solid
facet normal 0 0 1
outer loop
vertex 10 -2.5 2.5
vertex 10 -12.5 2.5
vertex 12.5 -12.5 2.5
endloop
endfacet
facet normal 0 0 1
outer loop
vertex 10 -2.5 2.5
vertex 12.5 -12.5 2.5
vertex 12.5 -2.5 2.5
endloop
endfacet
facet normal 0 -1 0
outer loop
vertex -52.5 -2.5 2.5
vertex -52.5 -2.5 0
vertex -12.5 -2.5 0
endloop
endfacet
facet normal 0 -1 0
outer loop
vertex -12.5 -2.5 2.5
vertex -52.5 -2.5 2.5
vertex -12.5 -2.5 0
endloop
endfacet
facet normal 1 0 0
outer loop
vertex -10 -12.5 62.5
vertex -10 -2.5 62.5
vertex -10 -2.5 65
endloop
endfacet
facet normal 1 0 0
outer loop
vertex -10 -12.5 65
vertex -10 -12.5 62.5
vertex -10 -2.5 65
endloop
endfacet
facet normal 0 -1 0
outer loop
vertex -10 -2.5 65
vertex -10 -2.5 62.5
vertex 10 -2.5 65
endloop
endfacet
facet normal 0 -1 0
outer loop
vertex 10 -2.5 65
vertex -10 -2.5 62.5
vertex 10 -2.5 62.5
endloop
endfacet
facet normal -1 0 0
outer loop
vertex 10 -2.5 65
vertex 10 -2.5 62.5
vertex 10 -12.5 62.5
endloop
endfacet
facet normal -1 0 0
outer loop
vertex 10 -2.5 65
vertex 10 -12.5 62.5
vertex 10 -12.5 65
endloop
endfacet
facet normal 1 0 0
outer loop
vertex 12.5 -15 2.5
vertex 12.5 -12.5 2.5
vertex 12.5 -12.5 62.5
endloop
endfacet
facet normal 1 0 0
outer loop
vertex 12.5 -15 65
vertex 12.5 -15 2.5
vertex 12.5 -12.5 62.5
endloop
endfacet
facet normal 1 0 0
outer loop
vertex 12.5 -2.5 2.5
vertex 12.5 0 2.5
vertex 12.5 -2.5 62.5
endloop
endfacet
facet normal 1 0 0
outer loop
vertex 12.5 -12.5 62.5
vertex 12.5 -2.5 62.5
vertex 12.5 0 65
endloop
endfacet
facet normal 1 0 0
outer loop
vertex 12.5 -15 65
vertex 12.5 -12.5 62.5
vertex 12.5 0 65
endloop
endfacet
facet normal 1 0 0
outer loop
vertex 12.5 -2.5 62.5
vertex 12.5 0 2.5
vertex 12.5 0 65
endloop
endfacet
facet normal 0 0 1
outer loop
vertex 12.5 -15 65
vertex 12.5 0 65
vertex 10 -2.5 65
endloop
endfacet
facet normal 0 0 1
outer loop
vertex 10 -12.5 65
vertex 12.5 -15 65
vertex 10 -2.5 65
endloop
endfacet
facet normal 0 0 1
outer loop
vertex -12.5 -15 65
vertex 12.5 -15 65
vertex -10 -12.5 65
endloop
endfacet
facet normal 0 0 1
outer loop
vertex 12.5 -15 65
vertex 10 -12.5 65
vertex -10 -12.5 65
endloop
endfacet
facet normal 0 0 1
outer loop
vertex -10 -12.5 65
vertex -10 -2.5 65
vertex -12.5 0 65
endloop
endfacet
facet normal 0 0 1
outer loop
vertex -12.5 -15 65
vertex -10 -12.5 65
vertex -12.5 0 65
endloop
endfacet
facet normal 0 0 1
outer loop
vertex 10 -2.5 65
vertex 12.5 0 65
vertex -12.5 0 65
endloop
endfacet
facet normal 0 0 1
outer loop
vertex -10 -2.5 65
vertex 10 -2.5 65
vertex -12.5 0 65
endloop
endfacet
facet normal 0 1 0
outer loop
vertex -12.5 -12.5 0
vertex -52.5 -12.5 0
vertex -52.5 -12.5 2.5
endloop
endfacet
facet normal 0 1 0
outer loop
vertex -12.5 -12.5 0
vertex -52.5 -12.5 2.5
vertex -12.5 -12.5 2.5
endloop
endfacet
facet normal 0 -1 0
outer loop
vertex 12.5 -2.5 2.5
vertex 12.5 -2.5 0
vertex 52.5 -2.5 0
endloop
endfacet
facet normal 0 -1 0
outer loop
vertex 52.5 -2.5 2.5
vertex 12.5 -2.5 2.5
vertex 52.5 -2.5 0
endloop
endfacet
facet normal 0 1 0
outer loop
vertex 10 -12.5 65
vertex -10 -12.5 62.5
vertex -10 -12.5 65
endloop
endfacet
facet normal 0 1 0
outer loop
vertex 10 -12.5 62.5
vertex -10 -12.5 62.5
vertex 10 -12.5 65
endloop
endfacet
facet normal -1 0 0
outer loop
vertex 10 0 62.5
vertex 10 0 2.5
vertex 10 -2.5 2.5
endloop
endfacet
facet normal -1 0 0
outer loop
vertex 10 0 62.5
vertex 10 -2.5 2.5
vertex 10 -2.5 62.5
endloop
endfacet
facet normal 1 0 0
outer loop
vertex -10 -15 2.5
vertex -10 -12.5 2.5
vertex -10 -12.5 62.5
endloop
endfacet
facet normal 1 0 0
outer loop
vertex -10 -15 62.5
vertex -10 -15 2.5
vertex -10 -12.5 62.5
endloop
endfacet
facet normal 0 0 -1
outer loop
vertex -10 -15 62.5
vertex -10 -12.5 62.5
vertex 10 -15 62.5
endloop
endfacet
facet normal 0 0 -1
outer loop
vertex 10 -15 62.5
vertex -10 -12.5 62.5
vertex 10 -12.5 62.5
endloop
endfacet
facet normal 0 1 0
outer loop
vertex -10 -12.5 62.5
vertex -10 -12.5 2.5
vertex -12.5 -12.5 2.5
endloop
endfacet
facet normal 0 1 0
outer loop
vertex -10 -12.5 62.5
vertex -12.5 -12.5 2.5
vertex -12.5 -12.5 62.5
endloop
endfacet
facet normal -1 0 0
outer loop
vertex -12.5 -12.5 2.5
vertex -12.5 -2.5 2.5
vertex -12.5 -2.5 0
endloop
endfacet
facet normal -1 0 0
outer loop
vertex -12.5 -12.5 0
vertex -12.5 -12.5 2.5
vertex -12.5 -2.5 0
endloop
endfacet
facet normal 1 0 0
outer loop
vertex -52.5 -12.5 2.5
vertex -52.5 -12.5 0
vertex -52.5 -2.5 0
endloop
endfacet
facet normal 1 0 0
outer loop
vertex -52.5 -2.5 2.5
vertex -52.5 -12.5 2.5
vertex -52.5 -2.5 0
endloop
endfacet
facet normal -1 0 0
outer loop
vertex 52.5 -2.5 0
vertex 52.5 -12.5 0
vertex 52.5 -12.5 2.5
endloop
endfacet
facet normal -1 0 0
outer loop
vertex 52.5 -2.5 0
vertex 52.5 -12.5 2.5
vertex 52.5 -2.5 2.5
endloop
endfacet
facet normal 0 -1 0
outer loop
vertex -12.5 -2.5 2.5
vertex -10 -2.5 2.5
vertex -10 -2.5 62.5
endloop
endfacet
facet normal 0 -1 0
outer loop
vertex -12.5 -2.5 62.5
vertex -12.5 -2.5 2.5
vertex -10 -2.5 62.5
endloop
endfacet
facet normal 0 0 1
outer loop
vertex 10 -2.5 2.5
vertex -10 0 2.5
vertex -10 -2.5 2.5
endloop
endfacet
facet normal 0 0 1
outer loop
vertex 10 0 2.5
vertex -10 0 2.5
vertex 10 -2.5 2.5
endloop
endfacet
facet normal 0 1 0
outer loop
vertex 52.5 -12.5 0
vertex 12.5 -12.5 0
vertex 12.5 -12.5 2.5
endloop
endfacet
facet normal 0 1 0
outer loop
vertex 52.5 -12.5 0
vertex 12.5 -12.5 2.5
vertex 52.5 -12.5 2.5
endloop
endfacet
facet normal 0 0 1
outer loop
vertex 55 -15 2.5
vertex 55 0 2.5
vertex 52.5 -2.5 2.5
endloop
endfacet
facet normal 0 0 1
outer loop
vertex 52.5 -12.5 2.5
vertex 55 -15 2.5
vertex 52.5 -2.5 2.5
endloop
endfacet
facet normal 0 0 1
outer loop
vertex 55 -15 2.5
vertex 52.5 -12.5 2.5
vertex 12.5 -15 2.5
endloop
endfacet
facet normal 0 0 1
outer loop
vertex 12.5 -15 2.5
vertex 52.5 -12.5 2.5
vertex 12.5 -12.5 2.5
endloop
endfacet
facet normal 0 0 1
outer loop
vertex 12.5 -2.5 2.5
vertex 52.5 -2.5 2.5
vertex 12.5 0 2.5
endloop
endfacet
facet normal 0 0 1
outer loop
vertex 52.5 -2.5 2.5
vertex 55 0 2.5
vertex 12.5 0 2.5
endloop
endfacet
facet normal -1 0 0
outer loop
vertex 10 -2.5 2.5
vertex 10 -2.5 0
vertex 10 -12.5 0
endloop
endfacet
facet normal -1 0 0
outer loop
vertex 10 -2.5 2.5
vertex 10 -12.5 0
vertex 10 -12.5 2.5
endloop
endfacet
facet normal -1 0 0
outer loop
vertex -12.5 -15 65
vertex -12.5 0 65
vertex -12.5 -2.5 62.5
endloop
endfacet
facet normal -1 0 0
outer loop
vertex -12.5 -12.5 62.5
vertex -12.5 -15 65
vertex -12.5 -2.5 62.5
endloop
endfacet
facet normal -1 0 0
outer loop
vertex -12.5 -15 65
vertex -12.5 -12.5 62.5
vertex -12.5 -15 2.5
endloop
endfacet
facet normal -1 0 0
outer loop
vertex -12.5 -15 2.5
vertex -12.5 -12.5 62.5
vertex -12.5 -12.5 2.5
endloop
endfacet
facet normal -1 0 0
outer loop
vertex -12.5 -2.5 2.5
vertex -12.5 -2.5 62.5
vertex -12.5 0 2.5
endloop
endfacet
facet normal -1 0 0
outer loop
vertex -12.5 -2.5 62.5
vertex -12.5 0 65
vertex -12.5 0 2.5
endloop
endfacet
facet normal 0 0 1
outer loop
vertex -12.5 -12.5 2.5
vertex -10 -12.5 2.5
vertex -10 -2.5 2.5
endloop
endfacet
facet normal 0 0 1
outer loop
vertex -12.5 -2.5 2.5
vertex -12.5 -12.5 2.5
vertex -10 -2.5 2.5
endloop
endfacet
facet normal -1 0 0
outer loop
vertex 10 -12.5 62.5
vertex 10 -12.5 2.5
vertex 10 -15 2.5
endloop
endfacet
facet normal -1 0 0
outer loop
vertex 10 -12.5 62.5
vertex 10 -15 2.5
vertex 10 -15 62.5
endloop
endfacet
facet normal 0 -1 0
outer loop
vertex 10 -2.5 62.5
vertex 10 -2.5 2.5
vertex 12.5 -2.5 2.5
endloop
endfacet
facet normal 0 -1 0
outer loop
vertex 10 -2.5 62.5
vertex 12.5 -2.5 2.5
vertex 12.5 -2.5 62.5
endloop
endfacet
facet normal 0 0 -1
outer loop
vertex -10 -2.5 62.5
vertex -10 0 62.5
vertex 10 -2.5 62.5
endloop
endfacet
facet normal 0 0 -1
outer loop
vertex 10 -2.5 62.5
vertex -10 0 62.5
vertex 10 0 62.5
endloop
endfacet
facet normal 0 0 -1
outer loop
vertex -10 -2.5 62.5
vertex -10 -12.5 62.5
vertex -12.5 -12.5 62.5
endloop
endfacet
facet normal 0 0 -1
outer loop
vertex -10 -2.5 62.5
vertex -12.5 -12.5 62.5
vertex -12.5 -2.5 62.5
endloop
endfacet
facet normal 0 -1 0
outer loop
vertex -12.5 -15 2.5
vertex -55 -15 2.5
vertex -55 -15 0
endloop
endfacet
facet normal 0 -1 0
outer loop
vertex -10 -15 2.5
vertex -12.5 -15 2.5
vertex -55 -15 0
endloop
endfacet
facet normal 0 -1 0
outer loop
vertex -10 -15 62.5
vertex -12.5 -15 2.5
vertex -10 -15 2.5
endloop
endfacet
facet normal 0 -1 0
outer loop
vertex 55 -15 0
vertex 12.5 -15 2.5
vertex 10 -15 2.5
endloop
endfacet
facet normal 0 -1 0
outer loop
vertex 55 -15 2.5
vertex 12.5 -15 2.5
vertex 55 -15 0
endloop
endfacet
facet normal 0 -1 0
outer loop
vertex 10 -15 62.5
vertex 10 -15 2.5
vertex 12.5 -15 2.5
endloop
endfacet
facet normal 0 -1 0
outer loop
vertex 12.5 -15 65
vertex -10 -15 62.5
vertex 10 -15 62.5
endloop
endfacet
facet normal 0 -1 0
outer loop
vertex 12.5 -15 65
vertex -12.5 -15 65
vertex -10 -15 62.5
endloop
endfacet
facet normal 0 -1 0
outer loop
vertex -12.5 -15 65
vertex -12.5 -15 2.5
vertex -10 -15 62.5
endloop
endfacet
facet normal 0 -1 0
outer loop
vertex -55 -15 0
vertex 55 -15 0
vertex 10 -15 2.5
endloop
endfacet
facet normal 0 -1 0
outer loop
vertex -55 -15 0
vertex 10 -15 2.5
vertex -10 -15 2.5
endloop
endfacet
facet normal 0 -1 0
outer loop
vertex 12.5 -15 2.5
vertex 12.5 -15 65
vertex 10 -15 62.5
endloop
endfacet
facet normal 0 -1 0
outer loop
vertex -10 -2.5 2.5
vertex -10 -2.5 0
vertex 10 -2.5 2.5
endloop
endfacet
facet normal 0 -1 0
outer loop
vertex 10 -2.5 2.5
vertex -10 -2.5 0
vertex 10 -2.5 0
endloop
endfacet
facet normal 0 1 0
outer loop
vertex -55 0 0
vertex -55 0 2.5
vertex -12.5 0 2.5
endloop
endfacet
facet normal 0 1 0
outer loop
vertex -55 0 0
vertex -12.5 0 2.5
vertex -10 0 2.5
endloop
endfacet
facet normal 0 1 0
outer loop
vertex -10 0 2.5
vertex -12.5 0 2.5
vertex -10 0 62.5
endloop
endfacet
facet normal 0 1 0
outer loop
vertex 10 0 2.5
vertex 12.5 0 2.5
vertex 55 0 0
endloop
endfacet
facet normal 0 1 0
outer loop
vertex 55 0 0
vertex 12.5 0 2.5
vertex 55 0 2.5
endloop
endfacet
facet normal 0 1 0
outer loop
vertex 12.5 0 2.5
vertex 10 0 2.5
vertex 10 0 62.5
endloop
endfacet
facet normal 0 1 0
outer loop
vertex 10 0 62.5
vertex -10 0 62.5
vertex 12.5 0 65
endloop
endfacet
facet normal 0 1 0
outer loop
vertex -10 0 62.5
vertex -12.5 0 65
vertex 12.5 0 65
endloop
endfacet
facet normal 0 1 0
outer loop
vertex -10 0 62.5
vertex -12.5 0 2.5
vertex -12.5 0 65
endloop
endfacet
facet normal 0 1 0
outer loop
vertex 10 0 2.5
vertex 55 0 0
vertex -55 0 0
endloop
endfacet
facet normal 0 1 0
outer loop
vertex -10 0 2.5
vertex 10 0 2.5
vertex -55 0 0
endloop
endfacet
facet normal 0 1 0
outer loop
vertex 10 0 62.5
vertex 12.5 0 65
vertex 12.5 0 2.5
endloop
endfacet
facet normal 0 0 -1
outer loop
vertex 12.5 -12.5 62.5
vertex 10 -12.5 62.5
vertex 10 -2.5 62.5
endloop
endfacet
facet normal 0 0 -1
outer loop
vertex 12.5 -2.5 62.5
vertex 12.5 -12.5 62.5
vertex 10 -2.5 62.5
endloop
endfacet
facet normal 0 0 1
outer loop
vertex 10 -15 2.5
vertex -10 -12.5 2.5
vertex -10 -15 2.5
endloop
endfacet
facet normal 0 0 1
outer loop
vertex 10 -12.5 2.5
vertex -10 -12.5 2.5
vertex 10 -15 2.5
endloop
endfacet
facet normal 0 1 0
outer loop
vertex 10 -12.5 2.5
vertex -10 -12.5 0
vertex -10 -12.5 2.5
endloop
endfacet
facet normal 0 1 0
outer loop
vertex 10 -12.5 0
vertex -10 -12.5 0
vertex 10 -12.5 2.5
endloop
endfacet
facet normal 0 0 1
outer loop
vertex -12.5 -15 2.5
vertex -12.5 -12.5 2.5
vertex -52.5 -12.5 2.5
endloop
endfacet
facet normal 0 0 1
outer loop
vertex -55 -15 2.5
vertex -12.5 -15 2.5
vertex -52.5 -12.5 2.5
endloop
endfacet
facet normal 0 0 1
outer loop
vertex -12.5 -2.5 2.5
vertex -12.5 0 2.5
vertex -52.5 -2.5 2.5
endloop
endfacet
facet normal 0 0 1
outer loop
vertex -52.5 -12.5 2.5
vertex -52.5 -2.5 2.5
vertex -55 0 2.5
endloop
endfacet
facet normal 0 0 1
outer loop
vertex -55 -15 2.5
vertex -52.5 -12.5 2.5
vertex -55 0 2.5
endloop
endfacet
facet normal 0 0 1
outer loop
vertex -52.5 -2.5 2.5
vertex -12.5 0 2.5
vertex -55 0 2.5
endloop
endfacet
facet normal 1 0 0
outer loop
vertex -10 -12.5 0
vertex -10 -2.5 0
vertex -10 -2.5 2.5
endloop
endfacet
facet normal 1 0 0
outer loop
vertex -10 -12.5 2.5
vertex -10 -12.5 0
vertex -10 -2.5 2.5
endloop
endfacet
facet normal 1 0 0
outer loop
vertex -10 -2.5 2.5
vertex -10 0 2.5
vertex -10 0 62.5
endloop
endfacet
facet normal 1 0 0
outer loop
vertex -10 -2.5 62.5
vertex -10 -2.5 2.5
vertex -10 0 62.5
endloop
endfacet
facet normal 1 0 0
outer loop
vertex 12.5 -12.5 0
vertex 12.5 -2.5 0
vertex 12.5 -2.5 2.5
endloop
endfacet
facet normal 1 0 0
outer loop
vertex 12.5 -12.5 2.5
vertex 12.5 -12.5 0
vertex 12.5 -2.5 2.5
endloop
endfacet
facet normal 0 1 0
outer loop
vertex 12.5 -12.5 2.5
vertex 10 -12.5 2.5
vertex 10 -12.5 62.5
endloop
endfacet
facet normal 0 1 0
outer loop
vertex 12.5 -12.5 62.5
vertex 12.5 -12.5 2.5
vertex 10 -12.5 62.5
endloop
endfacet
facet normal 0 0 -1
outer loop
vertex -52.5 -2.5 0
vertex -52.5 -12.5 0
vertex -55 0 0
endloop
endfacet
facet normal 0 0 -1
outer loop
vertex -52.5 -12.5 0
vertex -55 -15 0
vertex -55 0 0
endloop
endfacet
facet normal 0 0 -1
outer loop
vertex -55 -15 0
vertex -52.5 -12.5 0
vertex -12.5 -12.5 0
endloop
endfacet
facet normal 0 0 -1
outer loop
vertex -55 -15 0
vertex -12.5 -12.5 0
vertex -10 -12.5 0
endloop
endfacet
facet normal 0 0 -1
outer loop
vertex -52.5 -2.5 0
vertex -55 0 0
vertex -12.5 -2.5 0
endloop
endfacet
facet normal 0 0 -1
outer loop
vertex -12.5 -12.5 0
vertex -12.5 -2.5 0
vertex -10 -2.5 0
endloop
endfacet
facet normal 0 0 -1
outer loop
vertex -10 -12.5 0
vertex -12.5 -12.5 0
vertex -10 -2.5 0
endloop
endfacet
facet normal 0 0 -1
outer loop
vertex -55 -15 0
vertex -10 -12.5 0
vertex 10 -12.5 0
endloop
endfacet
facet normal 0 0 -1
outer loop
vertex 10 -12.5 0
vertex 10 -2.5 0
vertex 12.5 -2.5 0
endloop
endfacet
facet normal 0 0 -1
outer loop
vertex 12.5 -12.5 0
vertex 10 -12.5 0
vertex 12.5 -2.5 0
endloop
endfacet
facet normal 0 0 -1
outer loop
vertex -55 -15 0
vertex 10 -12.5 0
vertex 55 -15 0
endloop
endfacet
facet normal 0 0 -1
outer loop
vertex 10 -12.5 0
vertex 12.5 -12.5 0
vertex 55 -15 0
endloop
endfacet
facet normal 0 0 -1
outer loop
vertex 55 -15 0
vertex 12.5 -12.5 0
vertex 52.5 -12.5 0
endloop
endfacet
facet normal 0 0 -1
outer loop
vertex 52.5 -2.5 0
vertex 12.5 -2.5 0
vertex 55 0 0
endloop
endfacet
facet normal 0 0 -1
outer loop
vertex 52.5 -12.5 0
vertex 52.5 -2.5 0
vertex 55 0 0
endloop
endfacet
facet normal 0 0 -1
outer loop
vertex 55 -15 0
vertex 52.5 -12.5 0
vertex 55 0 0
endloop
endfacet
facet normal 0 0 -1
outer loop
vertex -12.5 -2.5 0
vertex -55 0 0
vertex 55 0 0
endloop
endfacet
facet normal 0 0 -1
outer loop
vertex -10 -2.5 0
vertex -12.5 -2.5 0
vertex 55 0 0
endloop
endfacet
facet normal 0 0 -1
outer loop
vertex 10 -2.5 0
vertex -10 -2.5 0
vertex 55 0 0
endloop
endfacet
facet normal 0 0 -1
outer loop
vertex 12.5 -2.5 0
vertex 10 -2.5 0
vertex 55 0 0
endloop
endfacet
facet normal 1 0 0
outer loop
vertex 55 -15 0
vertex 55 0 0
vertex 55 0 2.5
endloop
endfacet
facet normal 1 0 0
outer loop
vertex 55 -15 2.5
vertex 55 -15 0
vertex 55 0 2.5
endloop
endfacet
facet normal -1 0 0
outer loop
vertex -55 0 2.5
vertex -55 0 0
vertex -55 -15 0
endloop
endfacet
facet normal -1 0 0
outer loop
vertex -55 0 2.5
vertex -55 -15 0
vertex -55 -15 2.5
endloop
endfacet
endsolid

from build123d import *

# Parameters (mm, degrees)
F0_W          = 2.5
F0_H          = 2.5
F0_W_2        = 20
F0_H_2        = 60
F0_W_3        = 40
F1_DEPTH      = 15
F2_W          = 20
F2_H          = 10
F2_W_2        = 40
F3_DEPTH      = 70
F4_W          = 10
F4_H          = 60
F5_DEPTH      = 25
F5_DEPTH_BACK = 25


with BuildPart() as f1:
    # F0 (on Front) → F1 (new body)
    with BuildSketch(Plane.XZ):
        with Locations((-11.25, 63.75)):
            Rectangle(F0_W, F0_H)
        with Locations((0, 63.75)):
            Rectangle(F0_W_2, F0_H)
        with Locations((11.25, 63.75)):
            Rectangle(F0_W, F0_H)
        with Locations((-11.25, 32.5)):
            Rectangle(F0_W, F0_H_2)
        with Locations((11.25, 32.5)):
            Rectangle(F0_W, F0_H_2)
        with Locations((0, 1.25)):
            Rectangle(F0_W_2, F0_H)
        with Locations((-32.5, 1.25)):
            Rectangle(F0_W_3, F0_H)
        with Locations((32.5, 1.25)):
            Rectangle(F0_W_3, F0_H)
        with Locations((11.25, 1.25)):
            Rectangle(F0_W, F0_H)
        with Locations((53.75, 1.25)):
            Rectangle(F0_W, F0_H)
        with Locations((-11.25, 1.25)):
            Rectangle(F0_W, F0_H)
        with Locations((-53.75, 1.25)):
            Rectangle(F0_W, F0_H)
    extrude(amount=F1_DEPTH)

    # F2 (on Top) → F3 (cut)
    with BuildSketch(Plane.XY):
        with Locations((0, -7.5)):
            Rectangle(F2_W, F2_H)
        with Locations((32.5, -7.5)):
            Rectangle(F2_W_2, F2_H)
        with Locations((-32.5, -7.5)):
            Rectangle(F2_W_2, F2_H)
    extrude(amount=F3_DEPTH, mode=Mode.SUBTRACT)

    # F4 (on Right) → F5 (cut, two sides)
    with BuildSketch(Plane.YZ) as f5_sk:
        with Locations((-7.5, 32.5)):
            Rectangle(F4_W, F4_H)
    extrude(amount=-F5_DEPTH, mode=Mode.SUBTRACT)
    extrude(f5_sk.sketch, amount=F5_DEPTH_BACK, mode=Mode.SUBTRACT)


solid = f1.part
